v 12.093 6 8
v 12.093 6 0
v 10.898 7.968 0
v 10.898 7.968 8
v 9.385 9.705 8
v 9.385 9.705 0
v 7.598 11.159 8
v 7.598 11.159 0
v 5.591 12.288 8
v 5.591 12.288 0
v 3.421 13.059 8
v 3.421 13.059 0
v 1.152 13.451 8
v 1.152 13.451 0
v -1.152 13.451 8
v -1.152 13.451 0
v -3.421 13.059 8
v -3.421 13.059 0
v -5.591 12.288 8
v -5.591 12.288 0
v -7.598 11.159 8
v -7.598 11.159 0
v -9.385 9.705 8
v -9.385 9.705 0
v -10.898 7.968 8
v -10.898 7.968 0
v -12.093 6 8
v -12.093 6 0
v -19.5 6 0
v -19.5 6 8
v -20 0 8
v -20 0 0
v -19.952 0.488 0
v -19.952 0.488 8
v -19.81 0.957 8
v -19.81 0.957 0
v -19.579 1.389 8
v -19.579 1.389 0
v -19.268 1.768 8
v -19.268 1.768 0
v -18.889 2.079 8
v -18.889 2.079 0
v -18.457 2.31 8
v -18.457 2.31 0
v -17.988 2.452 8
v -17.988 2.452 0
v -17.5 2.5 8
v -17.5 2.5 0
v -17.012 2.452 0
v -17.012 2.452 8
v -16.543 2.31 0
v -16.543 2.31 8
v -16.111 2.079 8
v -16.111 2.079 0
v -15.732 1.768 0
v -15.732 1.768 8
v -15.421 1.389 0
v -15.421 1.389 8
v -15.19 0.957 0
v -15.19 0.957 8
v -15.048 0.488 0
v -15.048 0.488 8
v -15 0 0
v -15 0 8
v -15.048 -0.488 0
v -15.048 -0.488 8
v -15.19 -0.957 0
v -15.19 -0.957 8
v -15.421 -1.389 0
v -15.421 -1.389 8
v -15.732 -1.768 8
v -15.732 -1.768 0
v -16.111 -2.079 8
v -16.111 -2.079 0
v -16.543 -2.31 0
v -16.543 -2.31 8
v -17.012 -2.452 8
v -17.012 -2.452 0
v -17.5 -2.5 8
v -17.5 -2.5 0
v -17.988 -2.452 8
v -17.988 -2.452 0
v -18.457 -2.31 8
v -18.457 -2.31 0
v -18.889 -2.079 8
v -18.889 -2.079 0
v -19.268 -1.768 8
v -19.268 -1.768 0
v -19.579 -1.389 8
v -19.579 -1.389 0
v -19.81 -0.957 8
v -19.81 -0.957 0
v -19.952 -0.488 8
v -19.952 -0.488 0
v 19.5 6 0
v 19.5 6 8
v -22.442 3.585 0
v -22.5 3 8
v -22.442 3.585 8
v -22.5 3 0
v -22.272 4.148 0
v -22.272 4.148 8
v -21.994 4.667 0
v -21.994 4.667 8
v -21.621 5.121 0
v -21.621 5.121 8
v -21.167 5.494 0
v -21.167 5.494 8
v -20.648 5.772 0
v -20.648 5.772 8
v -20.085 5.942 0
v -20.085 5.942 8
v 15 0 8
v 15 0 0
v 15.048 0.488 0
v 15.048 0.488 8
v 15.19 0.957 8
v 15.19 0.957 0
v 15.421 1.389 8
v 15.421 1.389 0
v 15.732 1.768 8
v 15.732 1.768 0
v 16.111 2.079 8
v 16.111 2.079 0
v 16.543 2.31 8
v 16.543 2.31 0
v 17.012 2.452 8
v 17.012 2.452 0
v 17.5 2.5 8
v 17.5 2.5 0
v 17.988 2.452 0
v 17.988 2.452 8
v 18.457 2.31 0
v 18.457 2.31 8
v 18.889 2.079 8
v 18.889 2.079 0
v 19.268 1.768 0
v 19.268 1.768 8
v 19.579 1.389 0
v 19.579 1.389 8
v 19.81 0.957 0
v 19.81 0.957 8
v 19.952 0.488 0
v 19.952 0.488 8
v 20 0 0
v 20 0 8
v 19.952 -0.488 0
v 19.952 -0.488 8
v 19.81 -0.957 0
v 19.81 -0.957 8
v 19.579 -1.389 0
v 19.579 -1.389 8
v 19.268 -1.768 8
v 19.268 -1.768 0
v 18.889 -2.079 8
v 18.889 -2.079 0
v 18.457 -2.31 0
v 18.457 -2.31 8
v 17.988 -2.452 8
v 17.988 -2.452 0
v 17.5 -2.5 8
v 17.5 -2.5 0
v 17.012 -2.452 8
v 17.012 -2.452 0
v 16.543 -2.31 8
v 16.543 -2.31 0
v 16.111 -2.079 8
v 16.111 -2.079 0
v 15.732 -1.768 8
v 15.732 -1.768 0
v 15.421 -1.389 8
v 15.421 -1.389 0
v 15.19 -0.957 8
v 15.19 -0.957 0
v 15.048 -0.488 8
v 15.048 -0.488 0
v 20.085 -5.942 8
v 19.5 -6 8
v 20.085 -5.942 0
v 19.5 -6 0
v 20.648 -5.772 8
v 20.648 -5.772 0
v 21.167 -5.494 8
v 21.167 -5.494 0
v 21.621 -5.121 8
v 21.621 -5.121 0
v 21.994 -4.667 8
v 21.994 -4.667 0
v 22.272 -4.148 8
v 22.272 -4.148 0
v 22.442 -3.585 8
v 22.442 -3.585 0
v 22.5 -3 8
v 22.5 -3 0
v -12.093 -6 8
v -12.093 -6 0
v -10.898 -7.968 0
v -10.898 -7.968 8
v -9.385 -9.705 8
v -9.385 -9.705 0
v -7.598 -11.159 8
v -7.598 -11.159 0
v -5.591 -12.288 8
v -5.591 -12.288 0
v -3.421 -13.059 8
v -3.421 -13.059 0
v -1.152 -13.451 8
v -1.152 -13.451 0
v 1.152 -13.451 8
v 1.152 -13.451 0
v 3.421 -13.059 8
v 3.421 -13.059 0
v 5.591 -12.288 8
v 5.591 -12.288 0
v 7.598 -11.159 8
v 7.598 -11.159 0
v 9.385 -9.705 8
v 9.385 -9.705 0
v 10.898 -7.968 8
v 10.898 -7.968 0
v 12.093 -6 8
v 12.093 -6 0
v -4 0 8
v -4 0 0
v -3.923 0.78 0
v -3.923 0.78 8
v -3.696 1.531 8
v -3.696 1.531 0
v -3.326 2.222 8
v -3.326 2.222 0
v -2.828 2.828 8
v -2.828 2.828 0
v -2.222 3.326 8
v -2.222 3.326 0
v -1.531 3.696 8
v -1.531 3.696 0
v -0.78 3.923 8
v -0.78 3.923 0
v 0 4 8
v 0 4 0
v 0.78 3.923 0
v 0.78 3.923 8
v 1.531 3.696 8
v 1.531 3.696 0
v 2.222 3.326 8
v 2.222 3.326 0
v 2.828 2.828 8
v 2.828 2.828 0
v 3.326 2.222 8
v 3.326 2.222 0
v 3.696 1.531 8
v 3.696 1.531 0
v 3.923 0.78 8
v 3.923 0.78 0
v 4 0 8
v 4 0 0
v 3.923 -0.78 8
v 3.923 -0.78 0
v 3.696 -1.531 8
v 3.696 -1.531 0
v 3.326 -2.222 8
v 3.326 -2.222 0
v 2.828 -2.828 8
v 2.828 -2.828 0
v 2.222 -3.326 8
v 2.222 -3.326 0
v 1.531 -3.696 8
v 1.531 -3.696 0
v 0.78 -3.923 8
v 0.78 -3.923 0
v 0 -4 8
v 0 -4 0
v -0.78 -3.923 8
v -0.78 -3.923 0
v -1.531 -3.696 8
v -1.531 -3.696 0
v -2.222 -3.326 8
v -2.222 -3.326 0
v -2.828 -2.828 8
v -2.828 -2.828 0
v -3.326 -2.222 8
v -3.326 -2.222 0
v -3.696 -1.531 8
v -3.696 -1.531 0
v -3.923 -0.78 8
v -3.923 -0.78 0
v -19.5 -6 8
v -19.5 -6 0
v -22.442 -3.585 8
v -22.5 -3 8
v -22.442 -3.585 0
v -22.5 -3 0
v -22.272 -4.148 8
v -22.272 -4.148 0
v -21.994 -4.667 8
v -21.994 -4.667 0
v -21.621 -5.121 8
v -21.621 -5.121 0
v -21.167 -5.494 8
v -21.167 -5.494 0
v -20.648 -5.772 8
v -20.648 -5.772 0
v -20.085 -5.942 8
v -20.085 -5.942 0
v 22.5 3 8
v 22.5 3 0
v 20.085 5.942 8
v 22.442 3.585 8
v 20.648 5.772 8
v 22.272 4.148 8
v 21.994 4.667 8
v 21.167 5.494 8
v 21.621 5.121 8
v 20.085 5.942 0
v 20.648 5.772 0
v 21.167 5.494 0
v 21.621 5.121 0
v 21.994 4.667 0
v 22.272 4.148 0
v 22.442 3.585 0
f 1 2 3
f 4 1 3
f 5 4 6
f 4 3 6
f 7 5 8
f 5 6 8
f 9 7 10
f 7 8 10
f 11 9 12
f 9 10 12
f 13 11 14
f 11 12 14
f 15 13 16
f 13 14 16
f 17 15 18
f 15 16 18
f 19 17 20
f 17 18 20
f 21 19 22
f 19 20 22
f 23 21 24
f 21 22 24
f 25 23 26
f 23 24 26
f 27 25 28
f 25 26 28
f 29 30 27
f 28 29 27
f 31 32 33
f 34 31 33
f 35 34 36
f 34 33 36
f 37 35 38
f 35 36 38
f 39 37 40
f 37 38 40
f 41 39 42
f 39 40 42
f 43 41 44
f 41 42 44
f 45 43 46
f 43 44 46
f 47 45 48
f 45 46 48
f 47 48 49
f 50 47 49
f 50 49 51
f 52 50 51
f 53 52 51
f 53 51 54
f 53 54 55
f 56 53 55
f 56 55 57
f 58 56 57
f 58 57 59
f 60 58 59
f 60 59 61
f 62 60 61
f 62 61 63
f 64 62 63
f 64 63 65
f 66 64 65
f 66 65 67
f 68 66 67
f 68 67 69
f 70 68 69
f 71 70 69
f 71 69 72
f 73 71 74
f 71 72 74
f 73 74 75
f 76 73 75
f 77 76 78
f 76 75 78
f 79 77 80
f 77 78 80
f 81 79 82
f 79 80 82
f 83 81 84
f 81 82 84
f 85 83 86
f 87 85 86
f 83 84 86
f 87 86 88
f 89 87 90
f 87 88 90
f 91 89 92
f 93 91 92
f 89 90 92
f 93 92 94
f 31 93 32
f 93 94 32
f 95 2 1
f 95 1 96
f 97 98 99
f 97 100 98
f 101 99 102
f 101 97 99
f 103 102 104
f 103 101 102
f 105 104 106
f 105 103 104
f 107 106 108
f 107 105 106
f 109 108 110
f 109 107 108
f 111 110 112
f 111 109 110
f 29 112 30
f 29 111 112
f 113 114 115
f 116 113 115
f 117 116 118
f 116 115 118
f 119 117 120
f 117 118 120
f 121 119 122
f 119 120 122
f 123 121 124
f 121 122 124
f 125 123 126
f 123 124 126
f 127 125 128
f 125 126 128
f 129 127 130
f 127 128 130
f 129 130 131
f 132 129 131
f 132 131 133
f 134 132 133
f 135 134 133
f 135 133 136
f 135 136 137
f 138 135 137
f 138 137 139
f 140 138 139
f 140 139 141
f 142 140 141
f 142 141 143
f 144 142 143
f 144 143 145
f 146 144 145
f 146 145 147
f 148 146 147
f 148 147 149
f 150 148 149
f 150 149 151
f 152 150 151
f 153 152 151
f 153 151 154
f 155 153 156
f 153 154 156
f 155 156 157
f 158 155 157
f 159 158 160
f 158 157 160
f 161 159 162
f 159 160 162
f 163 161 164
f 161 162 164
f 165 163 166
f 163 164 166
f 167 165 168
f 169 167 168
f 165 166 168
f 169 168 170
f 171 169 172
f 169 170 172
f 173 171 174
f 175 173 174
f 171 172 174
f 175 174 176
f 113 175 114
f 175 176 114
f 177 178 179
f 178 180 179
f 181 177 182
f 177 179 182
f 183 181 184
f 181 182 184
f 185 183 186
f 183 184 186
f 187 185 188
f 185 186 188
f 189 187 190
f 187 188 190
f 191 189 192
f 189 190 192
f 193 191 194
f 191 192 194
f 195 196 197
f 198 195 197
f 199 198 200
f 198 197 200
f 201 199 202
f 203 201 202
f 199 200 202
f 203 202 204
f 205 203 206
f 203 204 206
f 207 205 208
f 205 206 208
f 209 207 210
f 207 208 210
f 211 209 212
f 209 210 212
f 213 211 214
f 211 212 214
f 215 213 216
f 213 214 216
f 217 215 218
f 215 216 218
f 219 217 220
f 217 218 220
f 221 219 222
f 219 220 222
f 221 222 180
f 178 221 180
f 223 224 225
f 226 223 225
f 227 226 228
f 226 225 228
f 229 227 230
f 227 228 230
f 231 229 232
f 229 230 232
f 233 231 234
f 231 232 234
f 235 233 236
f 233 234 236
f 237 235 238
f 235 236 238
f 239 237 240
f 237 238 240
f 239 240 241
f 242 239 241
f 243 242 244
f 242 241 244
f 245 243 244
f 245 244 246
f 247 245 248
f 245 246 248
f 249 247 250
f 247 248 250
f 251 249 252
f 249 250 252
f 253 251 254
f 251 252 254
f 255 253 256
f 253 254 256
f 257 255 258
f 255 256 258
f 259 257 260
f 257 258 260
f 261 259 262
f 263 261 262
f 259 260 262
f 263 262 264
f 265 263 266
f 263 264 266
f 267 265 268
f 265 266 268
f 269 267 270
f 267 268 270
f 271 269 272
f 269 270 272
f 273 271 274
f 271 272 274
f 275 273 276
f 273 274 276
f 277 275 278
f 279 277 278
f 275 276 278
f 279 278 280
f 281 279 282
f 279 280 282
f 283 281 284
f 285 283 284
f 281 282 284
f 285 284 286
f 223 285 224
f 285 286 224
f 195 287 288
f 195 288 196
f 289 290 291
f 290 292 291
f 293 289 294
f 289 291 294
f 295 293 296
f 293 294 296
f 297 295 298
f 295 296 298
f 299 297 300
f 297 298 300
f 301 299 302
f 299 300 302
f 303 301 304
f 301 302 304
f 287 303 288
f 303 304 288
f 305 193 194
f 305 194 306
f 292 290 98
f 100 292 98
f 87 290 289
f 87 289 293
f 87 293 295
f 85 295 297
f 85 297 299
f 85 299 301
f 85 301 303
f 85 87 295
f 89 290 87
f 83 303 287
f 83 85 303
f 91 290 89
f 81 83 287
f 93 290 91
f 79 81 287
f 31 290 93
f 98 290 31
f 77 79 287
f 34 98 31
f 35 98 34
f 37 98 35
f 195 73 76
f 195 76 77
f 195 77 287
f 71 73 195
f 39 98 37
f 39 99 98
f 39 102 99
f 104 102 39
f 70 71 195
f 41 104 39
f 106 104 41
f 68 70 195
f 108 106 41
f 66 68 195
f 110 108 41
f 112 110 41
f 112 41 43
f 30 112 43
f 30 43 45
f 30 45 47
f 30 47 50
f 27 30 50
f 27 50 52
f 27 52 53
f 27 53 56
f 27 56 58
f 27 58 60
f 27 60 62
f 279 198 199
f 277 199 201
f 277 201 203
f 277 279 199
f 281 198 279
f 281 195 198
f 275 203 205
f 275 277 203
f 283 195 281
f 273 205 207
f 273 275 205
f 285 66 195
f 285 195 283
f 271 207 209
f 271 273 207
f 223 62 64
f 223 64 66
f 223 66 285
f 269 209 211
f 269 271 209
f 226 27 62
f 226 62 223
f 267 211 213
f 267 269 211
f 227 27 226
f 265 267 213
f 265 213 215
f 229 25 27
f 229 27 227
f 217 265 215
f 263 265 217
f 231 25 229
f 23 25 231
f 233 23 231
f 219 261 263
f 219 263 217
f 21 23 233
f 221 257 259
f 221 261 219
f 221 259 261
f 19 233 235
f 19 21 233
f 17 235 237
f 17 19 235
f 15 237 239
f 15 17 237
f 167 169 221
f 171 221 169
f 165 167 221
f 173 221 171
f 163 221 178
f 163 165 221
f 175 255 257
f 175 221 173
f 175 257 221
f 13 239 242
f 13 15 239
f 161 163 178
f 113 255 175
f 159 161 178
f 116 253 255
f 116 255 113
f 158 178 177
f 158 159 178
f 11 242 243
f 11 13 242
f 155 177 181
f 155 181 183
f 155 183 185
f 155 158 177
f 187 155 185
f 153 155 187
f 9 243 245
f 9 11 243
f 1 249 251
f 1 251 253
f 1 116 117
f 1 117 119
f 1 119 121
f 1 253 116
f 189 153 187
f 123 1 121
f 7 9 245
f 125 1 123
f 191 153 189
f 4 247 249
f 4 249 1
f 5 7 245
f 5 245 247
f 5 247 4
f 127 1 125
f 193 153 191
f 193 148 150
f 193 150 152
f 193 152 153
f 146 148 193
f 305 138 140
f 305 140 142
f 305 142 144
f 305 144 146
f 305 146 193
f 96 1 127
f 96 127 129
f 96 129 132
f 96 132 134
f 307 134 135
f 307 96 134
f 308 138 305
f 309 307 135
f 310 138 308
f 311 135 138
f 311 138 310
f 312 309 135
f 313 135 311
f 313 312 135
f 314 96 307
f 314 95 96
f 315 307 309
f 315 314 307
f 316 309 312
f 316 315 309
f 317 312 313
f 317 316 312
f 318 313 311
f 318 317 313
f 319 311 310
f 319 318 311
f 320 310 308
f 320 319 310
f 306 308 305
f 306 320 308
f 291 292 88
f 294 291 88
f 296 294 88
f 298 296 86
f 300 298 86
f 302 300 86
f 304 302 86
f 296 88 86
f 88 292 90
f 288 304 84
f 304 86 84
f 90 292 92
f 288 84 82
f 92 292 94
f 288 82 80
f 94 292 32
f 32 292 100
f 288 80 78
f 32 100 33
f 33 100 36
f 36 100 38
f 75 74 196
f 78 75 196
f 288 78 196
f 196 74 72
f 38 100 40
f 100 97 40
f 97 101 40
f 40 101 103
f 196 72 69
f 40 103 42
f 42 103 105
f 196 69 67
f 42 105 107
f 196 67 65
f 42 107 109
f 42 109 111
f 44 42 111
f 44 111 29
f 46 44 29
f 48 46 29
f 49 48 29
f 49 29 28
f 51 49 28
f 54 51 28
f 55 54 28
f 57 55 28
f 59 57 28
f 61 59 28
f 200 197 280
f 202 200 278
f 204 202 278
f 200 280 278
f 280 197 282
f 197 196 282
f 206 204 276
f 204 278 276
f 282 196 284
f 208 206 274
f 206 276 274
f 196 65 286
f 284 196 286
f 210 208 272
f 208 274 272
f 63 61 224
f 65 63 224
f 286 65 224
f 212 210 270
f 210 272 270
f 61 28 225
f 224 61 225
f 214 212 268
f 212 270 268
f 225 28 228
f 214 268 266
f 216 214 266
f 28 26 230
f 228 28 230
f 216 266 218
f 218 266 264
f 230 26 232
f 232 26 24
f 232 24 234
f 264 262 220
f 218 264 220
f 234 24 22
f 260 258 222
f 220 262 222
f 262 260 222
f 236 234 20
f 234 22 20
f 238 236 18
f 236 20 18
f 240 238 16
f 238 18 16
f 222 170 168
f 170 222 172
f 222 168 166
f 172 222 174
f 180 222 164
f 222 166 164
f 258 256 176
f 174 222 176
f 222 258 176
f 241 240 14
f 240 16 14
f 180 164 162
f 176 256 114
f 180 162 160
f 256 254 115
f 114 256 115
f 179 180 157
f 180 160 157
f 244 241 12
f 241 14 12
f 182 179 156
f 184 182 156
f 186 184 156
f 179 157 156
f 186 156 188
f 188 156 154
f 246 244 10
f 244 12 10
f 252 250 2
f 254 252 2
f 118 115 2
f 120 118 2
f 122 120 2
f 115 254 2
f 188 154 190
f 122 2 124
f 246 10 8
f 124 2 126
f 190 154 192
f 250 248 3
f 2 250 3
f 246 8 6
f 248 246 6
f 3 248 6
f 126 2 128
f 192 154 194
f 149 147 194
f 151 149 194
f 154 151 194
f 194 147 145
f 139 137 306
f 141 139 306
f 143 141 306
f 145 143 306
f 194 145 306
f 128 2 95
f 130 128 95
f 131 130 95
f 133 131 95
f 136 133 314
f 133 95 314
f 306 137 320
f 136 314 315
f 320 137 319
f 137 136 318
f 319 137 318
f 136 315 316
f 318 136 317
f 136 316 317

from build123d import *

# Parameters (mm, degrees)
SKETCH_1_R          = 13.5
EXTRUDE_1_DEPTH     = 8
SKETCH_3_W          = 45
SKETCH_3_H          = 12
EXTRUDE_2_DEPTH     = 8
SKETCH_2_R          = 4
CUT_EXTRUDE_1_DEPTH = 8
SKETCH_4_R          = 2.5
CUT_EXTRUDE_2_DEPTH = 9
FILLET_1_R          = 3


with BuildPart() as part:
    # 草图1 → 凸台-拉伸1 (new body)
    with BuildSketch(Plane.XY):
        Circle(SKETCH_1_R)
    extrude(amount=EXTRUDE_1_DEPTH)

    # 草图3 → 凸台-拉伸2 (add)
    with BuildSketch(Plane.XY.offset(8)):
        Rectangle(SKETCH_3_W, SKETCH_3_H)
    extrude(amount=-EXTRUDE_2_DEPTH)

    # 草图2 → 切除-拉伸1 (cut)
    with BuildSketch(Plane(origin=(0, 0, 0), x_dir=(-1, 0, 0), z_dir=(0, 0, -1))):
        Circle(SKETCH_2_R)
    extrude(amount=-CUT_EXTRUDE_1_DEPTH, mode=Mode.SUBTRACT)

    # 草图4 → 切除-拉伸2 (cut, through all)
    with BuildSketch(Plane(origin=(0, 0, 0), x_dir=(-1, 0, 0), z_dir=(0, 0, -1))):
        with Locations((-17.5, 0)):
            Circle(SKETCH_4_R)
        with Locations((17.5, 0)):
            Circle(SKETCH_4_R)
    extrude(amount=-CUT_EXTRUDE_2_DEPTH, mode=Mode.SUBTRACT)

    # 圆角1
    fillet_1_edges = [part.edges().sort_by_distance(p)[0] for p in [
        (-22.5, 6, 4),
        (22.5, -6, 4),
        (-22.5, -6, 4),
        (22.5, 6, 4),
    ]]
    fillet(fillet_1_edges, radius=FILLET_1_R)


solid = part.part
